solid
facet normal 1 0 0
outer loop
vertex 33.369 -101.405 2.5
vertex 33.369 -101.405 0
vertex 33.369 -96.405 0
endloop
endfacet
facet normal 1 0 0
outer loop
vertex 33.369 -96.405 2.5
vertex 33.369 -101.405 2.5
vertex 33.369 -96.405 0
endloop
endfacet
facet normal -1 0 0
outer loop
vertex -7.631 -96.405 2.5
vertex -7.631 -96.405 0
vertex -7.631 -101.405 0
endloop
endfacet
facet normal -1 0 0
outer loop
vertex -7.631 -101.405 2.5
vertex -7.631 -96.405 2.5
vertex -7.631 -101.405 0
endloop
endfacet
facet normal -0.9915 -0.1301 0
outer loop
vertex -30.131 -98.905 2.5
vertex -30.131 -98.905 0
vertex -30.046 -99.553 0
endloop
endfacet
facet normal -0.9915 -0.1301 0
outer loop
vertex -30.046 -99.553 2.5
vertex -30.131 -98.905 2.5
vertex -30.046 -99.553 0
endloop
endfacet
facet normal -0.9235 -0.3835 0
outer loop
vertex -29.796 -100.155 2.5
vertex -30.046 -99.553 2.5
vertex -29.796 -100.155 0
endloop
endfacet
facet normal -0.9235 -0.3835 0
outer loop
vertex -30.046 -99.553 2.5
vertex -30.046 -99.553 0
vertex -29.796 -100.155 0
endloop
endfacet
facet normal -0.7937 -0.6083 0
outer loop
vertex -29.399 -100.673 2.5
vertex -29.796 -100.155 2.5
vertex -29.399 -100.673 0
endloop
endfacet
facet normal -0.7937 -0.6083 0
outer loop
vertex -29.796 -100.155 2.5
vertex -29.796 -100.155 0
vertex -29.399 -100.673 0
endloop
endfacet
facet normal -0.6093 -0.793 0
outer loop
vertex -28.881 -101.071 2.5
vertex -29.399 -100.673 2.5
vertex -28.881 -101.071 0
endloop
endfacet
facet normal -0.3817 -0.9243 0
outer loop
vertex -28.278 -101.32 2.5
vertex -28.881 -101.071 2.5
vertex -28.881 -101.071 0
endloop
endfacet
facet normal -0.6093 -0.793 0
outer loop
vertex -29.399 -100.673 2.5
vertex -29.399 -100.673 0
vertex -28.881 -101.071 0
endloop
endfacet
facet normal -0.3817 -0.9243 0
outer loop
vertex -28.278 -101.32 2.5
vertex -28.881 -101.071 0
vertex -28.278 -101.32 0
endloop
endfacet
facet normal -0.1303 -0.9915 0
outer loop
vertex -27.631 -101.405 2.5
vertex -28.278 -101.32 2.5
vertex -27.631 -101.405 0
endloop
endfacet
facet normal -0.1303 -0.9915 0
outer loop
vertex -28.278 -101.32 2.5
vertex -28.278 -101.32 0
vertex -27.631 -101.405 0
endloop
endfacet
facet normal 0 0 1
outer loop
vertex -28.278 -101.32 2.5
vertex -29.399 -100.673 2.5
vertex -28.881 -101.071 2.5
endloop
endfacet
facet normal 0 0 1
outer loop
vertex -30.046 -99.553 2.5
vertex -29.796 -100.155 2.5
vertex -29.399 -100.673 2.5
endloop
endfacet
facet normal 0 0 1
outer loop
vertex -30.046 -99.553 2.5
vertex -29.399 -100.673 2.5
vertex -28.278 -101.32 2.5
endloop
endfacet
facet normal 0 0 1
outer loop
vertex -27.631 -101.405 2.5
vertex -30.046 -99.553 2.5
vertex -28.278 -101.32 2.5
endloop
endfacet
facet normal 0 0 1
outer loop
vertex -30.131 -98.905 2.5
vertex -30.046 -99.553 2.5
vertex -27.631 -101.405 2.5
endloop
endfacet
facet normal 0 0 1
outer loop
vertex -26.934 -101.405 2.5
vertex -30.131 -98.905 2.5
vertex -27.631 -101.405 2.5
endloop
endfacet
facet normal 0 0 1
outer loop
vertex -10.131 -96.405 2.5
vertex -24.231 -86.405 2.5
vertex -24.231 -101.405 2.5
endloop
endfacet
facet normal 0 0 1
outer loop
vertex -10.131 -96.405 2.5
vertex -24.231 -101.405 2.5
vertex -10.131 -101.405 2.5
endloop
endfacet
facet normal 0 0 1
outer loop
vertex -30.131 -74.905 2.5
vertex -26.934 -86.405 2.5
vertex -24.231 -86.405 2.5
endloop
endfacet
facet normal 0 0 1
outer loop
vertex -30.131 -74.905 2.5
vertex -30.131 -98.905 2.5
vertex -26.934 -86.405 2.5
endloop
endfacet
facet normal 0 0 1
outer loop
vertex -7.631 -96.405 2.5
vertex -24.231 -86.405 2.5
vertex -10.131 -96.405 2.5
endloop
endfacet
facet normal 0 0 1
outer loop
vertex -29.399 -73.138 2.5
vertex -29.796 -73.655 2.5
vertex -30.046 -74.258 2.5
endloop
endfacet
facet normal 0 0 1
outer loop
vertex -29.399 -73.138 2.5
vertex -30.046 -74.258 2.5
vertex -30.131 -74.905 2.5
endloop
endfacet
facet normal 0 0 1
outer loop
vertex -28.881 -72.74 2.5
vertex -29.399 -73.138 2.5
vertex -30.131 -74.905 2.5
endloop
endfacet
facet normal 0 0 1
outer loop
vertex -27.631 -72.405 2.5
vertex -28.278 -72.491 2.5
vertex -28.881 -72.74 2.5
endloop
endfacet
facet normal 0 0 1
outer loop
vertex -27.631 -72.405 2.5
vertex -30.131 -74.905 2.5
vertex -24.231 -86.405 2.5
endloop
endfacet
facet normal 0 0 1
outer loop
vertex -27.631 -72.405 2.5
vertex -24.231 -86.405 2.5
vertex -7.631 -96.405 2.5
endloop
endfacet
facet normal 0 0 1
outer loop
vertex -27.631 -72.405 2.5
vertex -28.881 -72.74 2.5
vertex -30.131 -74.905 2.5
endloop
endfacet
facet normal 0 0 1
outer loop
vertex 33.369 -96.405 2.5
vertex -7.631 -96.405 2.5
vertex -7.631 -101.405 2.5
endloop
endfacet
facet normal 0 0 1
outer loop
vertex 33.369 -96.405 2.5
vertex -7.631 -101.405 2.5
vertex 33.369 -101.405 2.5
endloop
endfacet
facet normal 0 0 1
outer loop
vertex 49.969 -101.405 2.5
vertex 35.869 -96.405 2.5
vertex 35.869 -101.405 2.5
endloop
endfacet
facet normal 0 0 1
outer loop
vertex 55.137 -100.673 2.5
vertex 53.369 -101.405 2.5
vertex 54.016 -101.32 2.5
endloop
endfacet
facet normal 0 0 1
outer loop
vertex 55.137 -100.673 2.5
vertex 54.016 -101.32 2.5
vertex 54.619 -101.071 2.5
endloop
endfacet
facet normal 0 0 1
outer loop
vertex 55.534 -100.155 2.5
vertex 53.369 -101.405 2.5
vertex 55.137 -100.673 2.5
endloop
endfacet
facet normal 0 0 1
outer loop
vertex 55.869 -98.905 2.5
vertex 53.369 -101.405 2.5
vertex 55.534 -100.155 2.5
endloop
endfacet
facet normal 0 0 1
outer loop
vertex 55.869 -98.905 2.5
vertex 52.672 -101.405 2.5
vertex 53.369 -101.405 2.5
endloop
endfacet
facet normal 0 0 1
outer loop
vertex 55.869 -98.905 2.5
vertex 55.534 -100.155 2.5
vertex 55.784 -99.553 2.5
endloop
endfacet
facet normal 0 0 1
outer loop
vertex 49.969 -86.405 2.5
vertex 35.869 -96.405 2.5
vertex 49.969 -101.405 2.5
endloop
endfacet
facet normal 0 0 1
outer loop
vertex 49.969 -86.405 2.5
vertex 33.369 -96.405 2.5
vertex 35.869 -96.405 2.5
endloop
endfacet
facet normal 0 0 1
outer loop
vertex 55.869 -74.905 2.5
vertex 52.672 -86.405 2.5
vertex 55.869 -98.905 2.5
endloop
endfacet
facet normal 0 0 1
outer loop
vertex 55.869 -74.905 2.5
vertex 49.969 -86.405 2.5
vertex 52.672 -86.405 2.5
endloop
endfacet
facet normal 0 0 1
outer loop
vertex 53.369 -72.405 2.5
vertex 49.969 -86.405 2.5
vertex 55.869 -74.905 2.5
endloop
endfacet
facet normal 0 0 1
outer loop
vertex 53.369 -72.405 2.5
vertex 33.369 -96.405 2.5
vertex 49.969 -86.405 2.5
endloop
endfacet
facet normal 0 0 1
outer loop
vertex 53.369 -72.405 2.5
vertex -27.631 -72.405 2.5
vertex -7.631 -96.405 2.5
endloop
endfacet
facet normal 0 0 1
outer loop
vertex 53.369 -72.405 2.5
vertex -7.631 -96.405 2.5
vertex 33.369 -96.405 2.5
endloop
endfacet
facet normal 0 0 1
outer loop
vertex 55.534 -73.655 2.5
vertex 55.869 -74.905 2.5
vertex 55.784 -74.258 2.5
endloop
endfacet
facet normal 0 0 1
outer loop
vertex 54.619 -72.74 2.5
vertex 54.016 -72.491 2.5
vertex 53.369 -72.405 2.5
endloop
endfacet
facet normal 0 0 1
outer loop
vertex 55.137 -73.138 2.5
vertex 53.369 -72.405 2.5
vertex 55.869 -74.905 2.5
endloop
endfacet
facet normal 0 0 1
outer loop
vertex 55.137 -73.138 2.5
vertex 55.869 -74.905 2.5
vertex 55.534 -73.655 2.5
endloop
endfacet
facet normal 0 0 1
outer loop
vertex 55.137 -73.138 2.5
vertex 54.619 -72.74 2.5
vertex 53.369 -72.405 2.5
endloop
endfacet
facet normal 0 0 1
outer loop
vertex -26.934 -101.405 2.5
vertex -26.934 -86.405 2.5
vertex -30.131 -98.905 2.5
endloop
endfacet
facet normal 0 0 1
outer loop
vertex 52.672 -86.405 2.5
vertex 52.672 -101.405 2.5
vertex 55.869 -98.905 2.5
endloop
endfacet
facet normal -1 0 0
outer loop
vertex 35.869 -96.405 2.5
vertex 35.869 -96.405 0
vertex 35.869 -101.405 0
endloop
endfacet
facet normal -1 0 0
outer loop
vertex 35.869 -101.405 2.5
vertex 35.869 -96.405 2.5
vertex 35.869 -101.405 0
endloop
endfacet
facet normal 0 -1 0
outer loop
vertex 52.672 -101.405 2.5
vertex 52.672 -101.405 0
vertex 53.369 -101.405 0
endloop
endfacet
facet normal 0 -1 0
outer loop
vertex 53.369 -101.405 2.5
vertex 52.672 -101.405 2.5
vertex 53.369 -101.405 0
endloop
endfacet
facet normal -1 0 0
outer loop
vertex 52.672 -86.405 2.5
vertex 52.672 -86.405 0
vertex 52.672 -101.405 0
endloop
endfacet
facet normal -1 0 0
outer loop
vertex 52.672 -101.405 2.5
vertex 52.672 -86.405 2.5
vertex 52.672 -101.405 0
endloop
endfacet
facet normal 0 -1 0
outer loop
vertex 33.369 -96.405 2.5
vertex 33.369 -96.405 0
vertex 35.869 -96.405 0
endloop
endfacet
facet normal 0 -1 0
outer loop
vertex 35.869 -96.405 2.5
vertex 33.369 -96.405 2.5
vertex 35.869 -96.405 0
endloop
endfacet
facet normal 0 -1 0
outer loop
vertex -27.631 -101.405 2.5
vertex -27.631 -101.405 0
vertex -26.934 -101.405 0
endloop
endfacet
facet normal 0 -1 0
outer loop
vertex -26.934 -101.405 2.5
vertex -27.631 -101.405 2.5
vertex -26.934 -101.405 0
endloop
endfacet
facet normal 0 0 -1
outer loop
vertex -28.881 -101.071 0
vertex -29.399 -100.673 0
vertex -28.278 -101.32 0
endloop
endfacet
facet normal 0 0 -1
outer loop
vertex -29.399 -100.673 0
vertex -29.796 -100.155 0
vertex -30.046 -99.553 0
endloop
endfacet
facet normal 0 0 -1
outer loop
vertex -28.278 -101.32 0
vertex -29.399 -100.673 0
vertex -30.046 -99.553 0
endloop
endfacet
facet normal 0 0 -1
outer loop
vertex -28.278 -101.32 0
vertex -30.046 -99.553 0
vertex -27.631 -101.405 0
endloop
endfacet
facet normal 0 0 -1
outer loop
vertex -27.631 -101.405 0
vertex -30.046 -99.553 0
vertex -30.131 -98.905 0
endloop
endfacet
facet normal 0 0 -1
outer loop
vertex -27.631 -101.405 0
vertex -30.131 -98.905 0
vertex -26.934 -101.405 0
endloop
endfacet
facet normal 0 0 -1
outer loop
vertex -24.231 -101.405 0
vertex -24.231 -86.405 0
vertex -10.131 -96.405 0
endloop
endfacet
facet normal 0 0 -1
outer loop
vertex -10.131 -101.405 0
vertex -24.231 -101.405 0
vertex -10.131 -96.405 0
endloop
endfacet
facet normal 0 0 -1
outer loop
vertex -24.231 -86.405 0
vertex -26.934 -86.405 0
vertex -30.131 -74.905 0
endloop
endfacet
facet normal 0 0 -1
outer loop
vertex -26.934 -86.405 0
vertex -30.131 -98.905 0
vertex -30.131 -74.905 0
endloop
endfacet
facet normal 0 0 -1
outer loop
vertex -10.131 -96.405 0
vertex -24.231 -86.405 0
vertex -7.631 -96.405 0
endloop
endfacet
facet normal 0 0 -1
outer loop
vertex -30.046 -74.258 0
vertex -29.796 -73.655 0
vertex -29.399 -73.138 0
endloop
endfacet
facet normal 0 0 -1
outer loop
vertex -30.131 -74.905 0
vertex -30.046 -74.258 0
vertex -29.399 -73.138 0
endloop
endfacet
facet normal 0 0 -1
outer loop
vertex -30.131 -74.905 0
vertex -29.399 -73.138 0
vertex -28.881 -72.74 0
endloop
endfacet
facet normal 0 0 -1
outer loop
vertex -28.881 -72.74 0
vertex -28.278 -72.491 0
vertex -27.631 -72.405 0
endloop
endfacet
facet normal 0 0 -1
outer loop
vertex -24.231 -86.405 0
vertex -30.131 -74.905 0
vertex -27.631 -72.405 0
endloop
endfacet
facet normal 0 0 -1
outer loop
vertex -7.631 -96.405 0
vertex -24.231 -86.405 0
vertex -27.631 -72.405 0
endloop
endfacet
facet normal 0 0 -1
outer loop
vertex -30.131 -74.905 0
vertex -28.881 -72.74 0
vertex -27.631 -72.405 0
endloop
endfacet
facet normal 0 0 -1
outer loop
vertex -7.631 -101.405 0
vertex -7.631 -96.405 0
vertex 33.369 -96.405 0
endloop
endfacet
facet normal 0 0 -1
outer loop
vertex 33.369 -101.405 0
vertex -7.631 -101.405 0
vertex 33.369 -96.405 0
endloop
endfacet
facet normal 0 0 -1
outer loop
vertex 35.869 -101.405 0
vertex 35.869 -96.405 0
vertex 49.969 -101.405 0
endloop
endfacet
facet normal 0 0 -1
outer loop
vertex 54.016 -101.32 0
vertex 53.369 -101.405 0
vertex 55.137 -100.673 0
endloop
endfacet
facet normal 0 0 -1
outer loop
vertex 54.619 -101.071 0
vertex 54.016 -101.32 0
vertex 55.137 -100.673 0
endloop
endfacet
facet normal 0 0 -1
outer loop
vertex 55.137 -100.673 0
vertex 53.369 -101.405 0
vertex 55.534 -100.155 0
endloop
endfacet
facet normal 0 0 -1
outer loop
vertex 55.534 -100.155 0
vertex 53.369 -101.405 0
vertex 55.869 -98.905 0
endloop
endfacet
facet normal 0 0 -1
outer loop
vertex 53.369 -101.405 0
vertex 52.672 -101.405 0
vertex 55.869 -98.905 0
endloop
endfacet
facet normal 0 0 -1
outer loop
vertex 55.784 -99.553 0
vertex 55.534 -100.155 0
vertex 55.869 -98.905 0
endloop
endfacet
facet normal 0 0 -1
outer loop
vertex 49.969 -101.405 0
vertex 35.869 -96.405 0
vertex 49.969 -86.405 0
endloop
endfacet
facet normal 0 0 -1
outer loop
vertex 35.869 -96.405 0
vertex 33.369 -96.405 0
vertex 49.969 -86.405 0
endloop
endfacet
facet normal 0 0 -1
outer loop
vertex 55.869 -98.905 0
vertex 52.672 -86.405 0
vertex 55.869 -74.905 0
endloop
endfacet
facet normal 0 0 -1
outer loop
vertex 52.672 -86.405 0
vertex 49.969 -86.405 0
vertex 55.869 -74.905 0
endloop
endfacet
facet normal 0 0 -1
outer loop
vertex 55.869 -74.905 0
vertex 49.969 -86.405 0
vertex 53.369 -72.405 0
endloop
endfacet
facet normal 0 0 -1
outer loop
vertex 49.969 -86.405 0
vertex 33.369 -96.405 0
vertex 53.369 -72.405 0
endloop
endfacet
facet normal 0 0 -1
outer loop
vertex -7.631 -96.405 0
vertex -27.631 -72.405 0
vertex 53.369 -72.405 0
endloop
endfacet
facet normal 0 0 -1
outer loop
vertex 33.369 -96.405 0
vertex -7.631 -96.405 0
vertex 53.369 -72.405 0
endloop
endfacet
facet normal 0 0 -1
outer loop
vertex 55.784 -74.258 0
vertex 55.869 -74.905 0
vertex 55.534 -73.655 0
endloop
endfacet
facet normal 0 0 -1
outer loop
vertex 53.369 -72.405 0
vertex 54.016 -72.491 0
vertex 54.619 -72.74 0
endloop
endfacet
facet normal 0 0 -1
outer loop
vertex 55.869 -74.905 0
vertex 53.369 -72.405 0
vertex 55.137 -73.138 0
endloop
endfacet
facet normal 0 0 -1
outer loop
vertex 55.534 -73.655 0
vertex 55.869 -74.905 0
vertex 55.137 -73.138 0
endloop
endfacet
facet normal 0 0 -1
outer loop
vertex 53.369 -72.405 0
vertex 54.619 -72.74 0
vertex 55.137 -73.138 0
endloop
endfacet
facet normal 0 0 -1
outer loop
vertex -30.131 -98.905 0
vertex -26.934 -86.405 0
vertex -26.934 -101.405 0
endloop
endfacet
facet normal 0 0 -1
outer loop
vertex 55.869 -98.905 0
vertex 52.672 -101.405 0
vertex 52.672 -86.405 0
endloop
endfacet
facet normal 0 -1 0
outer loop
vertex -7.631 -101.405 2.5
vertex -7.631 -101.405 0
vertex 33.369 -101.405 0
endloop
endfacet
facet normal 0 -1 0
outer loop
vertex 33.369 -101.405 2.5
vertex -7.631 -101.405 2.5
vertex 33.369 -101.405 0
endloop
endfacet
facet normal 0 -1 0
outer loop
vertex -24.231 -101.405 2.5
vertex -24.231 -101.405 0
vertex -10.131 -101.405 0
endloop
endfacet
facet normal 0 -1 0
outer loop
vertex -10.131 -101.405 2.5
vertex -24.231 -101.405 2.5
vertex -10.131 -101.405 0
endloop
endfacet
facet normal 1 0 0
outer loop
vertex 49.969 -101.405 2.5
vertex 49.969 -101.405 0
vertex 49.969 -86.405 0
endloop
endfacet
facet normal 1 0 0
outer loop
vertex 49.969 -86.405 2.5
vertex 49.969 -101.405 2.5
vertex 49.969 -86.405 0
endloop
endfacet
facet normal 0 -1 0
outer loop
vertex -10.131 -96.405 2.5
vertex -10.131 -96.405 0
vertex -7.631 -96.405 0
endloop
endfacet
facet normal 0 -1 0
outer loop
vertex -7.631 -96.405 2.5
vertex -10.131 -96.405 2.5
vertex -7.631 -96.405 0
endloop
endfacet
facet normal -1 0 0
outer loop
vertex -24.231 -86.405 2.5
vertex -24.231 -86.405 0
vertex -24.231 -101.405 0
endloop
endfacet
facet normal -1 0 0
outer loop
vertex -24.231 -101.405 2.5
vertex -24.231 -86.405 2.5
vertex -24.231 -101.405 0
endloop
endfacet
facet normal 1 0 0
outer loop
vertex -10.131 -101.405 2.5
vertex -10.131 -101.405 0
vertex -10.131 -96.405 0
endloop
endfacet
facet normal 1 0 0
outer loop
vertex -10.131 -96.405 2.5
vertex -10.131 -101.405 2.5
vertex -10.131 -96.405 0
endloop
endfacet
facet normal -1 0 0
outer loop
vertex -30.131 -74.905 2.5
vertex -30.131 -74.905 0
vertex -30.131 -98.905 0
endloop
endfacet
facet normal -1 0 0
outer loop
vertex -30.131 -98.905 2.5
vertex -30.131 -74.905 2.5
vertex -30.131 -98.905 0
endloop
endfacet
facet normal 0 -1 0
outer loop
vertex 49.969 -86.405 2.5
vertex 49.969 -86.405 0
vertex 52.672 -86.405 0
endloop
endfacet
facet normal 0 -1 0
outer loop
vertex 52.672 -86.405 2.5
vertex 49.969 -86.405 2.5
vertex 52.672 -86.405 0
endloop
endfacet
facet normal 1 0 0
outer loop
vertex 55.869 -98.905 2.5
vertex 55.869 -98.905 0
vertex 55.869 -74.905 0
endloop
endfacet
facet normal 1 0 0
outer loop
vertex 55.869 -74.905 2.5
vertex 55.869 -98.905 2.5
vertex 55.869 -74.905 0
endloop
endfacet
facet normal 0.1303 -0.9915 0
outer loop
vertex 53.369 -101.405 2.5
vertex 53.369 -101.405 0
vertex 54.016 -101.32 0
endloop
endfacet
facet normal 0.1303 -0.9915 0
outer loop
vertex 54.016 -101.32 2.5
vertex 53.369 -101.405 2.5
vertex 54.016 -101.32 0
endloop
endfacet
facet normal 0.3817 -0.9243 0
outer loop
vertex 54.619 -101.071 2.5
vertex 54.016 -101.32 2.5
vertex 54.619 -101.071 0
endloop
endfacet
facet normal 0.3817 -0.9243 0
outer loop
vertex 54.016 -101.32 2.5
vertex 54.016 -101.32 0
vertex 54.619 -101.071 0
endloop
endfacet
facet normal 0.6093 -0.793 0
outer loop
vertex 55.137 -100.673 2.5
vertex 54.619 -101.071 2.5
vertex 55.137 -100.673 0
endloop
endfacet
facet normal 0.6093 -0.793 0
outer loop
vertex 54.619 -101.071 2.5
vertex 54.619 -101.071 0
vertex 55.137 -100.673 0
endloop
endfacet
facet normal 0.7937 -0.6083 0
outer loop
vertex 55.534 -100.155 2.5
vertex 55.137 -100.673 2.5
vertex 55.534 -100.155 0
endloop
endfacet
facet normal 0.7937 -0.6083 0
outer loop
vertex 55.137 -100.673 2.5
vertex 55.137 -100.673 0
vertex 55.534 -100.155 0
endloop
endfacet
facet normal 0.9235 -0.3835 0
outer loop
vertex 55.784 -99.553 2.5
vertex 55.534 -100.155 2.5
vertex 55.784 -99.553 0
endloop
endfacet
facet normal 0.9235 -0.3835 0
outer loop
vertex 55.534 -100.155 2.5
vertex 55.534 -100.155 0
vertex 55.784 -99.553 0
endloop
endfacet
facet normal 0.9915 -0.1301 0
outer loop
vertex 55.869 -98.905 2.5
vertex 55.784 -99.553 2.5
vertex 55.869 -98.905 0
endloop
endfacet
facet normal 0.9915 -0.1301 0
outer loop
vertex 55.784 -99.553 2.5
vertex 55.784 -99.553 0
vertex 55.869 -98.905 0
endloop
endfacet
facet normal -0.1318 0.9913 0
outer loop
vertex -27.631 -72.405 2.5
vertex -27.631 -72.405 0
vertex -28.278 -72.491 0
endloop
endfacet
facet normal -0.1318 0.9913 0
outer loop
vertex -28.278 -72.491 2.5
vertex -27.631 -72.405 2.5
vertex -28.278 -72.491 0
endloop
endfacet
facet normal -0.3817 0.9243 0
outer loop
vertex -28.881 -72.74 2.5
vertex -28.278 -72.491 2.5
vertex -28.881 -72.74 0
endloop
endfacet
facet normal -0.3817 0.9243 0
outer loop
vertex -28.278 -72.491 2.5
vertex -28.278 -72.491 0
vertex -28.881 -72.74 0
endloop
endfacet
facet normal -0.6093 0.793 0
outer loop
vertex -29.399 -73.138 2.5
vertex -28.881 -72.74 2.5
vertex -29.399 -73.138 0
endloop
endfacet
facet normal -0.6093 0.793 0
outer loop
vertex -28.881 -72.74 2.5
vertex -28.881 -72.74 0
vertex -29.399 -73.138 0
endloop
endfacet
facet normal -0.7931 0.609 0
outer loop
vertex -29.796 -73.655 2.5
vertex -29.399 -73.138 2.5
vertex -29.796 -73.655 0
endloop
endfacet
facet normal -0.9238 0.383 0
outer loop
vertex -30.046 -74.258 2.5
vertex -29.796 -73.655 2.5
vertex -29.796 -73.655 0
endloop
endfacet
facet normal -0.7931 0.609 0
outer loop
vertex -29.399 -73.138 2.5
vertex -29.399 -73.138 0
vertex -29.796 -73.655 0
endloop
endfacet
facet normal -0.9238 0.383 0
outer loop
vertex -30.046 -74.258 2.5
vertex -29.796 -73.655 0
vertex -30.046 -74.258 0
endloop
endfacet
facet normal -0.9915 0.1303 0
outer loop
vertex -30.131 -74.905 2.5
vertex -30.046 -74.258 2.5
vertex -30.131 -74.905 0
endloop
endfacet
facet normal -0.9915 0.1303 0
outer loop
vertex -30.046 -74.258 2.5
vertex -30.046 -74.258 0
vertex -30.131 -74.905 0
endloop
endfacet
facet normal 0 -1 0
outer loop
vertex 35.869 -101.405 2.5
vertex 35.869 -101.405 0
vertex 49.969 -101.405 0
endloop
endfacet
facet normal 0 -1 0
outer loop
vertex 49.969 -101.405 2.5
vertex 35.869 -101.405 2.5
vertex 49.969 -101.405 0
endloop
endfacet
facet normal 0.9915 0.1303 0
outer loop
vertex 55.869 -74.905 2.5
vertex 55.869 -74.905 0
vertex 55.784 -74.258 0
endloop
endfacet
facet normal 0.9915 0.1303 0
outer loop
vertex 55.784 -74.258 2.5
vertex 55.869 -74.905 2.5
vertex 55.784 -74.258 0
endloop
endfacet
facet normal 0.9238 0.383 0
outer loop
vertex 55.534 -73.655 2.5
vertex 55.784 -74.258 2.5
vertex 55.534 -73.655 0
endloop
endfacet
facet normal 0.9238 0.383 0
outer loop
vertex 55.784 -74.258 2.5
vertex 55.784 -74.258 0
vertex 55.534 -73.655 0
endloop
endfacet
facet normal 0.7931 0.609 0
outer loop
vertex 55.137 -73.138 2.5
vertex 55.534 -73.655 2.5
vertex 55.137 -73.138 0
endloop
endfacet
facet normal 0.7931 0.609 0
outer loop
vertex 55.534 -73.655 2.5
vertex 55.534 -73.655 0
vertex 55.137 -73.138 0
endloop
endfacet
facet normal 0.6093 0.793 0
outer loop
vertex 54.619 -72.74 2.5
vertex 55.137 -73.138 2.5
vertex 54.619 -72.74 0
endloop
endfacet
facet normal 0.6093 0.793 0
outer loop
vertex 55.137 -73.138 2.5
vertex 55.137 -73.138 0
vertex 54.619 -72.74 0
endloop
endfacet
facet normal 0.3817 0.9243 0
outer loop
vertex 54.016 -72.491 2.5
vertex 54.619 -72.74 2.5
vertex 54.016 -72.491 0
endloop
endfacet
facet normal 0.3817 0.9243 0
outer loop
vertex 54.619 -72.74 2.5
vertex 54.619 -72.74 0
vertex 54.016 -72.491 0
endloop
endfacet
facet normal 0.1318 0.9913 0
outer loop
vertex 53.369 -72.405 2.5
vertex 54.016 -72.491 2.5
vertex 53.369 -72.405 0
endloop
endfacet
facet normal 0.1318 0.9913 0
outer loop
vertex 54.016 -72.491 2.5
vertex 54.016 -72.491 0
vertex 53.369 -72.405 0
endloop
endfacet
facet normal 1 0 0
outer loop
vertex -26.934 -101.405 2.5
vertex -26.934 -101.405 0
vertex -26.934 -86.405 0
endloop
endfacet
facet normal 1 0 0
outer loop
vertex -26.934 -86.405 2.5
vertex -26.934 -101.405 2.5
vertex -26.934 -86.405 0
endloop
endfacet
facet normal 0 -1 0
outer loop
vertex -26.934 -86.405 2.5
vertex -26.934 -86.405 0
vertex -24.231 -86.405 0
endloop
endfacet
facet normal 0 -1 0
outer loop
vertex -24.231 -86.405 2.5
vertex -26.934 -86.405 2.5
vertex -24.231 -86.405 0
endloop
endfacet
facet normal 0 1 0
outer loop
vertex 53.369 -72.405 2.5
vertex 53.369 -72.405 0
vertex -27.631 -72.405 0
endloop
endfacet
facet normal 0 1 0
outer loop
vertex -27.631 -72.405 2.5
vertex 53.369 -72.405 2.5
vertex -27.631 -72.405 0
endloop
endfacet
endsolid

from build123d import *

# Parameters (mm, degrees)
RESSALTO_EXTRUS_O1_DEPTH = 2.5


with BuildPart() as part:
    # Esboço1 → Ressalto-extrusão1 (new body)
    with BuildSketch(Plane.XY):
        with BuildLine():
            Line((53.368768098, -72.405467359), (-27.631231902, -72.405467359))
            ThreePointArc((-27.631231902, -72.405467359), (-29.398998855, -73.137700406), (-30.131231902, -74.905467359))
            Line((-30.131231902, -74.905467359), (-30.131231902, -98.905467359))
            ThreePointArc((-30.131231902, -98.905467359), (-29.398998855, -100.673234312), (-27.631231902, -101.405467359))
            Line((-27.631231902, -101.405467359), (-26.934280418, -101.405467359))
            Line((-26.934280418, -101.405467359), (-26.934280418, -86.405467359))
            Line((-26.934280418, -86.405467359), (-24.231231902, -86.405467359))
            Line((-24.231231902, -86.405467359), (-24.231231902, -101.405467359))
            Line((-24.231231902, -101.405467359), (-10.131231902, -101.405467359))
            Line((-10.131231902, -101.405467359), (-10.131231902, -96.405467359))
            Line((-10.131231902, -96.405467359), (-7.631231902, -96.405467359))
            Line((-7.631231902, -96.405467359), (-7.631231902, -101.405467359))
            Line((-7.631231902, -101.405467359), (33.368768098, -101.405467359))
            Line((33.368768098, -101.405467359), (33.368768098, -96.405467359))
            Line((33.368768098, -96.405467359), (35.868768098, -96.405467359))
            Line((35.868768098, -96.405467359), (35.868768098, -101.405467359))
            Line((35.868768098, -101.405467359), (49.968768098, -101.405467359))
            Line((49.968768098, -101.405467359), (49.968768098, -86.405467359))
            Line((49.968768098, -86.405467359), (52.671816614, -86.405467359))
            Line((52.671816614, -86.405467359), (52.671816614, -101.405467359))
            Line((52.671816614, -101.405467359), (53.368768098, -101.405467359))
            ThreePointArc((53.368768098, -101.405467359), (55.136535051, -100.673234312), (55.868768098, -98.905467359))
            Line((55.868768098, -98.905467359), (55.868768098, -74.905467359))
            ThreePointArc((55.868768098, -74.905467359), (55.136535051, -73.137700406), (53.368768098, -72.405467359))
        make_face()
    extrude(amount=RESSALTO_EXTRUS_O1_DEPTH)


solid = part.part
